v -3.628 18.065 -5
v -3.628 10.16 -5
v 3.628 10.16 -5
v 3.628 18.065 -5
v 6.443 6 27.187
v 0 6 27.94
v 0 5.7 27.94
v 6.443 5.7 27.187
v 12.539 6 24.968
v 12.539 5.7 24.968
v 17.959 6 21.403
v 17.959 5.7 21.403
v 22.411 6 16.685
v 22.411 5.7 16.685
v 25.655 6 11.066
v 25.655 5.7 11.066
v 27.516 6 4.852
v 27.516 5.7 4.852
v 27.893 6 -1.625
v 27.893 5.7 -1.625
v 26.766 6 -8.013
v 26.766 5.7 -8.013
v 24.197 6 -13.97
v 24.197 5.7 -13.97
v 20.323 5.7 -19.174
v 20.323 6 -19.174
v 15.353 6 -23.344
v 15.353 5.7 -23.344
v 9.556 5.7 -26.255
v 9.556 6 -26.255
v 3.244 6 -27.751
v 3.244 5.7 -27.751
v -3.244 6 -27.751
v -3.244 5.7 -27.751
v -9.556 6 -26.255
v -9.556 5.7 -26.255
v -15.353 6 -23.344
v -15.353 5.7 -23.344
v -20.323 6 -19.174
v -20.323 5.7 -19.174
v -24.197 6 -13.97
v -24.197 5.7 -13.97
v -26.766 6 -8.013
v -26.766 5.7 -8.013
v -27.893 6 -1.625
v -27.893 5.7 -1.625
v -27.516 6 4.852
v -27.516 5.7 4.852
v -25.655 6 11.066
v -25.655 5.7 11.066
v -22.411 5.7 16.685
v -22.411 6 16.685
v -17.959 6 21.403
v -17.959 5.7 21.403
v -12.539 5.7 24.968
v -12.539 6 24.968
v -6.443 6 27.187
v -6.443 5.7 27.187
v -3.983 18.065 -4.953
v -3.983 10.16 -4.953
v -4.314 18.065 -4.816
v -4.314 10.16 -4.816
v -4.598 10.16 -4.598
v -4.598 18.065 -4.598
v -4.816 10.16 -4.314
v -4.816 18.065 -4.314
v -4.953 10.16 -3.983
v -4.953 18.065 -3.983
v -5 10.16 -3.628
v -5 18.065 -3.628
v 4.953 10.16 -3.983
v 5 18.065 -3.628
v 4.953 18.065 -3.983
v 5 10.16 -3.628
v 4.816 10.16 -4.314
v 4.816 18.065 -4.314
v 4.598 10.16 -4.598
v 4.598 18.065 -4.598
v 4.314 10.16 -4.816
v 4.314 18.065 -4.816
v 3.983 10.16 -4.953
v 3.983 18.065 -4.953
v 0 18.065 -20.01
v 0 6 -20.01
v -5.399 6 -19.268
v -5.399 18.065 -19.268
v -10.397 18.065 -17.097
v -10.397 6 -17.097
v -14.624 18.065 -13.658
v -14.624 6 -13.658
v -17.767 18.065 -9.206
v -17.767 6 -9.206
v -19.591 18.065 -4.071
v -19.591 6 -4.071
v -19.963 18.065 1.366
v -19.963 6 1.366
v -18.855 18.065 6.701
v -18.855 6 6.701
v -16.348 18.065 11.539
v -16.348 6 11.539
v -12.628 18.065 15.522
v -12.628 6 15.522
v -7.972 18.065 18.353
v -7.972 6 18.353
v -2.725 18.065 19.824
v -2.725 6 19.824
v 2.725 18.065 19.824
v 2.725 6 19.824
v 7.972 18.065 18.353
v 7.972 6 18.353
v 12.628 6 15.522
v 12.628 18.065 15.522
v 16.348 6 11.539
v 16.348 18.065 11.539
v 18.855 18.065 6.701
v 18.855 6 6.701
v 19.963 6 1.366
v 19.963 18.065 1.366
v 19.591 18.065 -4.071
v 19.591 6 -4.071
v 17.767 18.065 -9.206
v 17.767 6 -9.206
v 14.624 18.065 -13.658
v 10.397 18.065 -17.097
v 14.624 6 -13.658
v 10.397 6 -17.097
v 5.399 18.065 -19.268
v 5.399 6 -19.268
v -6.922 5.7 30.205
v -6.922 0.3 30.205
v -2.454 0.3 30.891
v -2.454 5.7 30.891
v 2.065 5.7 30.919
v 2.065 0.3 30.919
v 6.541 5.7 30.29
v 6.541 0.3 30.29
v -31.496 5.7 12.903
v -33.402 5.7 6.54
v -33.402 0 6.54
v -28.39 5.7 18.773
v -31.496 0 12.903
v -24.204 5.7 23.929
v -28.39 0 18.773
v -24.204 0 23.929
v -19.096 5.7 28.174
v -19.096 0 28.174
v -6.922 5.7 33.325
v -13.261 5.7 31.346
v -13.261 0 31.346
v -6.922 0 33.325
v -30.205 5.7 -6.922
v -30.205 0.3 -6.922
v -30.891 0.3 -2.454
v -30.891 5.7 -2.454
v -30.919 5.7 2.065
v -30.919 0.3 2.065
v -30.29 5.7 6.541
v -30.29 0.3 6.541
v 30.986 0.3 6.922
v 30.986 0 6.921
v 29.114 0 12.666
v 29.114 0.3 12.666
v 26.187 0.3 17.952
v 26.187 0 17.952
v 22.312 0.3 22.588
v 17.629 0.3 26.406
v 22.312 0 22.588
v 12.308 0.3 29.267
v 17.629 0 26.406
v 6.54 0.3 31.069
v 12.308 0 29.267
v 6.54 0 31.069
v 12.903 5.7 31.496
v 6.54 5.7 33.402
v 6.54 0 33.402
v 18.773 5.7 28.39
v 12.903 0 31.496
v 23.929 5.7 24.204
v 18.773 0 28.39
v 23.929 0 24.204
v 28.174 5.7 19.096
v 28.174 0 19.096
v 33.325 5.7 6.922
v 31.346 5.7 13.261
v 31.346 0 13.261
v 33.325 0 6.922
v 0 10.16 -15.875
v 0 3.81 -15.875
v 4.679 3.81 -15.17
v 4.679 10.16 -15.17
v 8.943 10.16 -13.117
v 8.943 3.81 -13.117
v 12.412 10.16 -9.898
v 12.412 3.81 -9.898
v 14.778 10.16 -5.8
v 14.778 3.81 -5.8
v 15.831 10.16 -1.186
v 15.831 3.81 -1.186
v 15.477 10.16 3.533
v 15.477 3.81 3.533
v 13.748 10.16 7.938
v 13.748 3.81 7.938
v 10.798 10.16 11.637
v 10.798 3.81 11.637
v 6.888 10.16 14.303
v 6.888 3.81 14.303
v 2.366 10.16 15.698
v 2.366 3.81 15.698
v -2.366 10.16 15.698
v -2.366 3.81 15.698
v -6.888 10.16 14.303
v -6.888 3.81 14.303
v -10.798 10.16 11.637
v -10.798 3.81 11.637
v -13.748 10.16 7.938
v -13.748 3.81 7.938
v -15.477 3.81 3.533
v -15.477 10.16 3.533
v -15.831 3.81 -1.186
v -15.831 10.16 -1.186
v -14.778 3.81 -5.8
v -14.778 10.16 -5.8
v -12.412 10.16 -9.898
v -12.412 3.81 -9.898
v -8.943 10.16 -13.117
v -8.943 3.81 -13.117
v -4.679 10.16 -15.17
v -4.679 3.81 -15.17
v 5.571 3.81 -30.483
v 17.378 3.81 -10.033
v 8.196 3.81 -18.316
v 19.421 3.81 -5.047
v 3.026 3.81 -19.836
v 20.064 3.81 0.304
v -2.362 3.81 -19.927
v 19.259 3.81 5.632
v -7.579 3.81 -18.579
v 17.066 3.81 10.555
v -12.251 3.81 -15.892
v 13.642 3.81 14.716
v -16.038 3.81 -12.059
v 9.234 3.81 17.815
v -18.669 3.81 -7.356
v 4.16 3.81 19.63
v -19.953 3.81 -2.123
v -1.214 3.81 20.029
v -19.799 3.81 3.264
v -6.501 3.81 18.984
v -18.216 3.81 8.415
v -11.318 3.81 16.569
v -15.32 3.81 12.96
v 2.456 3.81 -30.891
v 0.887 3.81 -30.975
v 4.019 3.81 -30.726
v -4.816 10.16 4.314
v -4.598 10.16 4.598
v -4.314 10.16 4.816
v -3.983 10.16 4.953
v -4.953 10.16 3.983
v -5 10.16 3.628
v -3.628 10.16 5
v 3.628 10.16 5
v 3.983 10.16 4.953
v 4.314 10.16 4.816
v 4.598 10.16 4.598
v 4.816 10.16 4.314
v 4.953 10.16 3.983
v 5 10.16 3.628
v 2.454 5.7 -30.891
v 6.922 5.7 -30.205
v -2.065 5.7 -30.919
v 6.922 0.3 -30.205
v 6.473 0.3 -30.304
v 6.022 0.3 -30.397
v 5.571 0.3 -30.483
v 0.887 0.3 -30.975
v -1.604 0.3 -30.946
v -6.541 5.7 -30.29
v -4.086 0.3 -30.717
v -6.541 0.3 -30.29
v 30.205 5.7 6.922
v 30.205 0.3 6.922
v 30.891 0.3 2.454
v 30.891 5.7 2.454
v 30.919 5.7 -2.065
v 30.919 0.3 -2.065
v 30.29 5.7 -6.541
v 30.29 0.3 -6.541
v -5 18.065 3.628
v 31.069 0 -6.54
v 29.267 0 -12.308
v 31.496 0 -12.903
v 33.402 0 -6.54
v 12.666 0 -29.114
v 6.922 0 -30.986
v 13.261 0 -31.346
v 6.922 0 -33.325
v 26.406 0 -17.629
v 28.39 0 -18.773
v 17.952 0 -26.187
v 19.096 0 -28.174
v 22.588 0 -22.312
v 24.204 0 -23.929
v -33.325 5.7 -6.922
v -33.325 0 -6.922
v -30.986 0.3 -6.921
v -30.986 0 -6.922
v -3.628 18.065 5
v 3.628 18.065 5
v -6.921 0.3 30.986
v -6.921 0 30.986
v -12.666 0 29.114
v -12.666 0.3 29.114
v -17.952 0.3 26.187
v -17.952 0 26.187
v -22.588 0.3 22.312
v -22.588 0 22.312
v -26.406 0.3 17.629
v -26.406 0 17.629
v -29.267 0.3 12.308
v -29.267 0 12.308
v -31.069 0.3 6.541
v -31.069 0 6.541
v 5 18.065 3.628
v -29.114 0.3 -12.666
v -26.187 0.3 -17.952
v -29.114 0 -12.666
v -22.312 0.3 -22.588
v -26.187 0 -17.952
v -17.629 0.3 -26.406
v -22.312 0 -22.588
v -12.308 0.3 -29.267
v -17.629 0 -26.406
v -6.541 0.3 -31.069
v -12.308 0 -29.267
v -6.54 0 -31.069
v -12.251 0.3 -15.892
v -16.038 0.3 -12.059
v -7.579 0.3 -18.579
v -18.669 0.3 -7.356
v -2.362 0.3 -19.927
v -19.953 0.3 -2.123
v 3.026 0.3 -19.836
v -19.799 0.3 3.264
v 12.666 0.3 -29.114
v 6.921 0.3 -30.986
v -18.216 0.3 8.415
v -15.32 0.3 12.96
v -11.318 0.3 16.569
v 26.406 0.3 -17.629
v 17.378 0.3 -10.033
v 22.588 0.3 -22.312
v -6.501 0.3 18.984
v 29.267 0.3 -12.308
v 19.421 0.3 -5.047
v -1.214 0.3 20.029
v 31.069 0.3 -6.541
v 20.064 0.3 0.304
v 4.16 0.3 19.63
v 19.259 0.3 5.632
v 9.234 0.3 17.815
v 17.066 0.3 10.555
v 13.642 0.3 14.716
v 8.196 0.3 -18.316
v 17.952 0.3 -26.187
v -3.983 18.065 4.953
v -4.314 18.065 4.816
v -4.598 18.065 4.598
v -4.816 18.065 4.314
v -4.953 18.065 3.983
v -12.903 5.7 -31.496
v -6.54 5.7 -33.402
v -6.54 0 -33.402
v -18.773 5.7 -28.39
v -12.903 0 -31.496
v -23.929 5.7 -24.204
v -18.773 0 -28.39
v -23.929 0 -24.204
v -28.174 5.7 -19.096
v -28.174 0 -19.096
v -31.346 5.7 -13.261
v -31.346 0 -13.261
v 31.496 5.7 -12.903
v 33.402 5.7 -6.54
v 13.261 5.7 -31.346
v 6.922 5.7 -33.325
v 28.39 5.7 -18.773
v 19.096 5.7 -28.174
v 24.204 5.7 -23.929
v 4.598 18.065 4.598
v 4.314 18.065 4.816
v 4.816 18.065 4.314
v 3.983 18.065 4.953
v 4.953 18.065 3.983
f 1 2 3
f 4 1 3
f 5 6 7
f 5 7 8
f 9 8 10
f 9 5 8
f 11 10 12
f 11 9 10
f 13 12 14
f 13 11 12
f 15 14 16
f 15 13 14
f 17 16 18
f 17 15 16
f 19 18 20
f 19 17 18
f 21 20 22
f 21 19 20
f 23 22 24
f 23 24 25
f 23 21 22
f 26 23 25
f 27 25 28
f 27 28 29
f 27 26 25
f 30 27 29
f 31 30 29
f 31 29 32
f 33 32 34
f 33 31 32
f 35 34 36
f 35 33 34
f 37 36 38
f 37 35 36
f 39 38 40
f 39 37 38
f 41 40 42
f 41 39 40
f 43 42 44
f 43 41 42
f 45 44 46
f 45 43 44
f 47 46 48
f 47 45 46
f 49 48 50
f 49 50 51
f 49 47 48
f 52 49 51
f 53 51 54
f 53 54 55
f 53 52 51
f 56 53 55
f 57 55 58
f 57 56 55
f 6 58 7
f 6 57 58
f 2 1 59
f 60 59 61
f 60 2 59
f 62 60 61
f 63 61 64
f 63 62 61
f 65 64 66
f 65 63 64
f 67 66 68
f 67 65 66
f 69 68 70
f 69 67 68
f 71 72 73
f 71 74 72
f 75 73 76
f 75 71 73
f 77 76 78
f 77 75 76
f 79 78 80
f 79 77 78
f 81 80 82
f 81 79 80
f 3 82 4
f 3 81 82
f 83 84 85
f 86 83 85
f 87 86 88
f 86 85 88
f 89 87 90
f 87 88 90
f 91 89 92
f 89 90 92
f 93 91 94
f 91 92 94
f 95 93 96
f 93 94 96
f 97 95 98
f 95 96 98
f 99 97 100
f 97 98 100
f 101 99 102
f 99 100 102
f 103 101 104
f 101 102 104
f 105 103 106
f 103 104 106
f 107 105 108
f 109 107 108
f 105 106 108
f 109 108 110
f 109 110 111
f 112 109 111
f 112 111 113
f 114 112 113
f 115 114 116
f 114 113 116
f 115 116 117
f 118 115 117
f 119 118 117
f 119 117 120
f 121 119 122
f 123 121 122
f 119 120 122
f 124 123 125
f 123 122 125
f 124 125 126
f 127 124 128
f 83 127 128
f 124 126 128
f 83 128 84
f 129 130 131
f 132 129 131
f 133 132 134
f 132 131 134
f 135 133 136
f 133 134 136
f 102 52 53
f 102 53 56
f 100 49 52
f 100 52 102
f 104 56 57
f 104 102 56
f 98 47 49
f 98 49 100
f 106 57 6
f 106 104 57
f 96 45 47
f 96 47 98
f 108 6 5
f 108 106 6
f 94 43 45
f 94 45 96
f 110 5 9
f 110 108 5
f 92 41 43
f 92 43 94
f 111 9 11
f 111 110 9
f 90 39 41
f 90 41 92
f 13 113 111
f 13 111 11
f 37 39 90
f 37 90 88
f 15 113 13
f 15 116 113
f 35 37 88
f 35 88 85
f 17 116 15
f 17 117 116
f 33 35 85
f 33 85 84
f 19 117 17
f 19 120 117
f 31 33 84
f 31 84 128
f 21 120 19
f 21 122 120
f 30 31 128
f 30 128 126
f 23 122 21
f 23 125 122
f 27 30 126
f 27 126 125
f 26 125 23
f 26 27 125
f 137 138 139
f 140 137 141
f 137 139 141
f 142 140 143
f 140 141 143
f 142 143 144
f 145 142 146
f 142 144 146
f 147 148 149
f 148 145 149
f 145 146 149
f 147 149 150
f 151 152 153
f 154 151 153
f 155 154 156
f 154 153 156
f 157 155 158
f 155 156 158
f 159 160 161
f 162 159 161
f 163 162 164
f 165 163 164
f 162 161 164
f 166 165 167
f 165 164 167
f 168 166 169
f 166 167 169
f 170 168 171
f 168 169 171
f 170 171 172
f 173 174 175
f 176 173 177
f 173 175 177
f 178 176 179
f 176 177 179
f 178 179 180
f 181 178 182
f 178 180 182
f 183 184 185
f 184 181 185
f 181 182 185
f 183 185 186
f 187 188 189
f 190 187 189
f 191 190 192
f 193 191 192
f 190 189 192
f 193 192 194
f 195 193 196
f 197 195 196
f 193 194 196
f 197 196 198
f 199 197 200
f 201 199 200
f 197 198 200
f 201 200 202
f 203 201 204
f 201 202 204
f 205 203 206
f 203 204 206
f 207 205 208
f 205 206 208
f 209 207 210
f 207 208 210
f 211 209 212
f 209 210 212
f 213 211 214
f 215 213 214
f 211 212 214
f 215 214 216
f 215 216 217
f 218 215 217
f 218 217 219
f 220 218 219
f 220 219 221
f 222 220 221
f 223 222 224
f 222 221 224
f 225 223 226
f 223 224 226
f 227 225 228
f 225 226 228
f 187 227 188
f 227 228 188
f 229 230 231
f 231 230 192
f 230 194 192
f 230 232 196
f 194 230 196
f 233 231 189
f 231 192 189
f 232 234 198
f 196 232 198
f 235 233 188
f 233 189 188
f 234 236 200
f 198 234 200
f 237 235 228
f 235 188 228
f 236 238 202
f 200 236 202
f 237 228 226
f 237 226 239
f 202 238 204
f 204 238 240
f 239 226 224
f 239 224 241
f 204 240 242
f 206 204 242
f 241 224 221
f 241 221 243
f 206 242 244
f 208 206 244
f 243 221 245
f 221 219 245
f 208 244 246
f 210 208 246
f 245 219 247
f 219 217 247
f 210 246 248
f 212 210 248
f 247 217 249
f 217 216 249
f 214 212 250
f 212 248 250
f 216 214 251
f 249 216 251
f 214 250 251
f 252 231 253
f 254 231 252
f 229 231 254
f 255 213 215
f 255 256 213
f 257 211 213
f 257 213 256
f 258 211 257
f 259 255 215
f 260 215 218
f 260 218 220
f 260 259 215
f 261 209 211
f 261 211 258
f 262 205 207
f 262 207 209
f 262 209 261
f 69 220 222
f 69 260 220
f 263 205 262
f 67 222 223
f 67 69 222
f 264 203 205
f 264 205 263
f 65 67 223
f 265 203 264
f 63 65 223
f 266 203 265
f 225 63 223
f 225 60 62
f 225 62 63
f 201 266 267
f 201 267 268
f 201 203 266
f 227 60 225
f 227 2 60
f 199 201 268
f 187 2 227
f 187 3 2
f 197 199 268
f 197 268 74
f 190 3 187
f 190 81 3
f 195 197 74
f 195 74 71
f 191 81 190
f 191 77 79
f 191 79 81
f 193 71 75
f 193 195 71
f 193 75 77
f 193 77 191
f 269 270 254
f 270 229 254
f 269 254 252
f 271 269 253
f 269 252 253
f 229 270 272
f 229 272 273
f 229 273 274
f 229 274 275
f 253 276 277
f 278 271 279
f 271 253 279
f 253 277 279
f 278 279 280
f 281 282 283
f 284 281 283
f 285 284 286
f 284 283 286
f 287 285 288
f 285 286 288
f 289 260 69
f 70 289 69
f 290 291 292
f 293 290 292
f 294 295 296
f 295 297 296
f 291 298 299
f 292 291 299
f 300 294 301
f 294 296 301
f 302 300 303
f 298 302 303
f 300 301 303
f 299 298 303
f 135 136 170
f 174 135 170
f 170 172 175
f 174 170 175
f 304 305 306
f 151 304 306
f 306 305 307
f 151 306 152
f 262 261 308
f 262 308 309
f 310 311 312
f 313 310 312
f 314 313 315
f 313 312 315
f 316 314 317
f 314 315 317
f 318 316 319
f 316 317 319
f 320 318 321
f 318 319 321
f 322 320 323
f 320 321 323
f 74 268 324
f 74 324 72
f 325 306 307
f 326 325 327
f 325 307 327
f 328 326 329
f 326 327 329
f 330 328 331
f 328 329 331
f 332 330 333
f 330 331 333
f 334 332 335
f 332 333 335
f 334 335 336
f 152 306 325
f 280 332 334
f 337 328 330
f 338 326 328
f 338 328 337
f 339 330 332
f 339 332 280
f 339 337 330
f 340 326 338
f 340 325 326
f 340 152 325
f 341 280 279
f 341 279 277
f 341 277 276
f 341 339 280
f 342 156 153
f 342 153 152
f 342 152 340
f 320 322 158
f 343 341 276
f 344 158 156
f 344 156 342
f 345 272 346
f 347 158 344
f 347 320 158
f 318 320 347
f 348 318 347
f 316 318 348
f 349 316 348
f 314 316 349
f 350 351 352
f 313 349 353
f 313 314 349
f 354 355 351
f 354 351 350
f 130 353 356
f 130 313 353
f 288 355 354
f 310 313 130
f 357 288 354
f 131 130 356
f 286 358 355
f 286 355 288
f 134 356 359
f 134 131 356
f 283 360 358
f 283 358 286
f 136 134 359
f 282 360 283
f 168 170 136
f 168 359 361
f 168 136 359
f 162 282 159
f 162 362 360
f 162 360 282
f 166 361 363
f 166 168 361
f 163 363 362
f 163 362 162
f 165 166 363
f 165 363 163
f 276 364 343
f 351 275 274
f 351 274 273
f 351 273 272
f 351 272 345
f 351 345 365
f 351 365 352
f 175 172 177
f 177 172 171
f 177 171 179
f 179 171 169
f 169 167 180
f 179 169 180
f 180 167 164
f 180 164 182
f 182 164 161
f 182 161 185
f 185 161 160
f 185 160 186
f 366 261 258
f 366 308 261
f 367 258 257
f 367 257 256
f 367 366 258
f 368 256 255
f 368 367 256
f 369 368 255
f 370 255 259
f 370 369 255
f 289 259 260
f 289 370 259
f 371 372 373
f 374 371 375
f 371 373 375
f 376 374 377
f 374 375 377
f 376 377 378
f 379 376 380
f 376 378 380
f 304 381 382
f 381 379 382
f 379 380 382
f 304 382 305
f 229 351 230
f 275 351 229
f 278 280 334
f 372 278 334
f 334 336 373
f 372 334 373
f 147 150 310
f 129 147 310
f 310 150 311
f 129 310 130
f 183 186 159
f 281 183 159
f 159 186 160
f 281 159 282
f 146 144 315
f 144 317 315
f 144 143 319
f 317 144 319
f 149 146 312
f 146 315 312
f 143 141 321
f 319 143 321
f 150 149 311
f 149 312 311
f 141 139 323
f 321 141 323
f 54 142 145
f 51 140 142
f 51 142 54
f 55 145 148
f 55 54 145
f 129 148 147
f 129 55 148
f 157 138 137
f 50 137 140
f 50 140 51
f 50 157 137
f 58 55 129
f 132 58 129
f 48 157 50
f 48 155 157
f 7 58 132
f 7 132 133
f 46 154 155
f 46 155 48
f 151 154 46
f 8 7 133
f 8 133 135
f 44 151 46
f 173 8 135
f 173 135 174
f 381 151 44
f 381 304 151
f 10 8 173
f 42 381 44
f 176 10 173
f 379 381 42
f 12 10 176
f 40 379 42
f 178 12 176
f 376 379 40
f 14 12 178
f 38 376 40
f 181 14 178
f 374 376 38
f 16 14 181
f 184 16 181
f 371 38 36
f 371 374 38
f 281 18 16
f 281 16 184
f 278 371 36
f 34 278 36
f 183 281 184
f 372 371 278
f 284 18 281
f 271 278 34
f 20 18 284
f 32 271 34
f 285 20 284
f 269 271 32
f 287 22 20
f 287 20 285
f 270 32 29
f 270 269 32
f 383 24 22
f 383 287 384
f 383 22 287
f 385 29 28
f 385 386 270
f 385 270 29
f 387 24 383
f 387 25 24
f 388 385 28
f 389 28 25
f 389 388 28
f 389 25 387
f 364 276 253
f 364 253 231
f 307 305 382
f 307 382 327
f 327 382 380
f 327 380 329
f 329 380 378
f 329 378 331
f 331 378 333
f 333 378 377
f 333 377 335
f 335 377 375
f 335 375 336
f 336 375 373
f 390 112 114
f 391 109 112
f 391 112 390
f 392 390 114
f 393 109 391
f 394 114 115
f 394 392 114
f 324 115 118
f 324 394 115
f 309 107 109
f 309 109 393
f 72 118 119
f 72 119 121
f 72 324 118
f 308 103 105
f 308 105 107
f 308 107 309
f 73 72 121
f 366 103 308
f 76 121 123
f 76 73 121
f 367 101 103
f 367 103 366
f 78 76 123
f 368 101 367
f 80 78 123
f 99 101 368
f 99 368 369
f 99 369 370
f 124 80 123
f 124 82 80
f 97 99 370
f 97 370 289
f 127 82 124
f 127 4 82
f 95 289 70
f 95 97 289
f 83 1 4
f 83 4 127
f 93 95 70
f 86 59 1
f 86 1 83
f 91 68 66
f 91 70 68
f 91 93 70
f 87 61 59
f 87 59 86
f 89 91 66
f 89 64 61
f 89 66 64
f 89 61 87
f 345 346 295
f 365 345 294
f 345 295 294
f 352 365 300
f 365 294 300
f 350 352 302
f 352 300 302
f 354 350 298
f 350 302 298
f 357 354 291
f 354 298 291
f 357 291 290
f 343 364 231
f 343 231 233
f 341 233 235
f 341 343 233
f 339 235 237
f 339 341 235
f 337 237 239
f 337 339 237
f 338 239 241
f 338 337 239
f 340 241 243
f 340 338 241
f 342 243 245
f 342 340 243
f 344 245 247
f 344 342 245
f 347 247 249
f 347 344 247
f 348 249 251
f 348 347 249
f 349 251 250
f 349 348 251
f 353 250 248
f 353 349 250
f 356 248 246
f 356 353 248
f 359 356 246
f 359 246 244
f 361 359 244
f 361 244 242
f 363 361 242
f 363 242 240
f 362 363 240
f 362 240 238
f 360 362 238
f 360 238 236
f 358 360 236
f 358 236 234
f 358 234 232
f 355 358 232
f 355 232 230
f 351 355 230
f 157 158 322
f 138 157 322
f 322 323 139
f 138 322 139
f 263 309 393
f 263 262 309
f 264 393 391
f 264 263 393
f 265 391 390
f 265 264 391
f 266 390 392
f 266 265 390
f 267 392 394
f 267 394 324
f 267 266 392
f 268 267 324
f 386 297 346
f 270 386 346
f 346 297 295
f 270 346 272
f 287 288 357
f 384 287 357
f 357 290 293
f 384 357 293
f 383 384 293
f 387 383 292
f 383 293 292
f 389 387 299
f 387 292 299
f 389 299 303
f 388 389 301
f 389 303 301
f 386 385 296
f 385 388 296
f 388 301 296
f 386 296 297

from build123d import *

# Parameters (mm, degrees)
SKETCH1_W           = 10
SKETCH1_H           = 10
BOSS_EXTRUDE2_DEPTH = 6
CUT_EXTRUDE1_DEPTH  = 3.81
SKETCH3_R           = 31.75
CUT_EXTRUDE2_DEPTH  = 0.3
SKETCH4_R           = 20.01
SKETCH4_W           = 10
SKETCH4_H           = 10
BOSS_EXTRUDE3_DEPTH = 12.065
SKETCH5_R           = 15.875
CUT_EXTRUDE3_DEPTH  = 6.35
FILLET1_R           = 1.3716
SKETCH6_R           = 54.970137174
SKETCH6_R_2         = 27.94
CUT_EXTRUDE4_DEPTH  = 0.3


with BuildPart() as part:
    # Sketch1 → Boss-Extrude2 (new body)
    with BuildSketch(Plane(origin=(0, 0, 0), x_dir=(1, 0, 0), z_dir=(0, 1, 0))):
        with BuildLine():
            Line((30.289899368, 6.5405), (33.401663967, 6.5405))
            ThreePointArc((33.401663967, 6.5405), (24.204111991, 23.929276184), (6.9215, 33.32479758))
            Line((6.9215, 33.32479758), (6.9215, 30.205115159))
            ThreePointArc((6.9215, 30.205115159), (0.195159782, 30.987385444), (-6.5405, 30.289899368))
            Line((-6.5405, 30.289899368), (-6.5405, 33.401663967))
            ThreePointArc((-6.5405, 33.401663967), (-23.929276184, 24.204111991), (-33.32479758, 6.9215))
            Line((-33.32479758, 6.9215), (-30.205115159, 6.9215))
            ThreePointArc((-30.205115159, 6.9215), (-30.987385444, 0.195159782), (-30.289899368, -6.5405))
            Line((-30.289899368, -6.5405), (-33.401663967, -6.5405))
            ThreePointArc((-33.401663967, -6.5405), (-24.204111991, -23.929276184), (-6.9215, -33.32479758))
            Line((-6.9215, -33.32479758), (-6.9215, -30.205115159))
            ThreePointArc((-6.9215, -30.205115159), (-0.195159782, -30.987385444), (6.5405, -30.289899368))
            Line((6.5405, -30.289899368), (6.5405, -33.401663967))
            ThreePointArc((6.5405, -33.401663967), (23.929276184, -24.204111991), (33.32479758, -6.9215))
            Line((33.32479758, -6.9215), (30.205115159, -6.9215))
            ThreePointArc((30.205115159, -6.9215), (30.987385444, -0.195159782), (30.289899368, 6.5405))
        make_face()
        Rectangle(SKETCH1_W, SKETCH1_H, mode=Mode.SUBTRACT)
    extrude(amount=BOSS_EXTRUDE2_DEPTH)

    # Sketch2 → Cut-Extrude1 (cut)
    with BuildSketch(Plane.XZ):
        with BuildLine():
            Line((17.377665752, -10.033), (-0.286554615, -40.628327152))
            ThreePointArc((-0.286554615, -40.628327152), (-2.416432138, -40.557415308), (-4.539661745, -40.374924792))
            Line((-4.539661745, -40.374924792), (8.196212586, -18.315743371))
            ThreePointArc((8.196212586, -18.315743371), (-13.440862054, 14.899247741), (17.377665752, -10.033))
        make_face()
    extrude(amount=-CUT_EXTRUDE1_DEPTH, mode=Mode.SUBTRACT)

    # Sketch3 → Cut-Extrude2 (cut)
    with BuildSketch(Plane.XZ):
        Circle(SKETCH3_R)
    extrude(amount=-CUT_EXTRUDE2_DEPTH, mode=Mode.SUBTRACT)

    # Sketch4 → Boss-Extrude3 (add)
    with BuildSketch(Plane(origin=(0, 6, 0), x_dir=(1, 0, 0), z_dir=(0, 1, 0))):
        with Locations(Location((0, 0, 0), (0, 0, 90))):
            Circle(SKETCH4_R)
        Rectangle(SKETCH4_W, SKETCH4_H, mode=Mode.SUBTRACT)
    extrude(amount=BOSS_EXTRUDE3_DEPTH)

    # Sketch5 → Cut-Extrude3 (cut)
    with BuildSketch(Plane.XZ.offset(-3.81)):
        with Locations(Location((0, 0, 0), (0, 0, 270))):
            Circle(SKETCH5_R)
    extrude(amount=-CUT_EXTRUDE3_DEPTH, mode=Mode.SUBTRACT)

    # Fillet1
    fillet1_edges = [part.edges().sort_by_distance(p)[0] for p in [
        (5, 14.1125, -5),
        (-5, 14.1125, -5),
        (-5, 14.1125, 5),
        (5, 14.1125, 5),
    ]]
    fillet(fillet1_edges, radius=FILLET1_R)

    # Sketch6 → Cut-Extrude4 (cut)
    with BuildSketch(Plane(origin=(0, 6, 0), x_dir=(1, 0, 0), z_dir=(0, 1, 0))):
        Circle(SKETCH6_R)
        with Locations(Location((0, 0, 0), (0, 0, 270))):
            Circle(SKETCH6_R_2, mode=Mode.SUBTRACT)
    extrude(amount=-CUT_EXTRUDE4_DEPTH, mode=Mode.SUBTRACT)


solid = part.part
